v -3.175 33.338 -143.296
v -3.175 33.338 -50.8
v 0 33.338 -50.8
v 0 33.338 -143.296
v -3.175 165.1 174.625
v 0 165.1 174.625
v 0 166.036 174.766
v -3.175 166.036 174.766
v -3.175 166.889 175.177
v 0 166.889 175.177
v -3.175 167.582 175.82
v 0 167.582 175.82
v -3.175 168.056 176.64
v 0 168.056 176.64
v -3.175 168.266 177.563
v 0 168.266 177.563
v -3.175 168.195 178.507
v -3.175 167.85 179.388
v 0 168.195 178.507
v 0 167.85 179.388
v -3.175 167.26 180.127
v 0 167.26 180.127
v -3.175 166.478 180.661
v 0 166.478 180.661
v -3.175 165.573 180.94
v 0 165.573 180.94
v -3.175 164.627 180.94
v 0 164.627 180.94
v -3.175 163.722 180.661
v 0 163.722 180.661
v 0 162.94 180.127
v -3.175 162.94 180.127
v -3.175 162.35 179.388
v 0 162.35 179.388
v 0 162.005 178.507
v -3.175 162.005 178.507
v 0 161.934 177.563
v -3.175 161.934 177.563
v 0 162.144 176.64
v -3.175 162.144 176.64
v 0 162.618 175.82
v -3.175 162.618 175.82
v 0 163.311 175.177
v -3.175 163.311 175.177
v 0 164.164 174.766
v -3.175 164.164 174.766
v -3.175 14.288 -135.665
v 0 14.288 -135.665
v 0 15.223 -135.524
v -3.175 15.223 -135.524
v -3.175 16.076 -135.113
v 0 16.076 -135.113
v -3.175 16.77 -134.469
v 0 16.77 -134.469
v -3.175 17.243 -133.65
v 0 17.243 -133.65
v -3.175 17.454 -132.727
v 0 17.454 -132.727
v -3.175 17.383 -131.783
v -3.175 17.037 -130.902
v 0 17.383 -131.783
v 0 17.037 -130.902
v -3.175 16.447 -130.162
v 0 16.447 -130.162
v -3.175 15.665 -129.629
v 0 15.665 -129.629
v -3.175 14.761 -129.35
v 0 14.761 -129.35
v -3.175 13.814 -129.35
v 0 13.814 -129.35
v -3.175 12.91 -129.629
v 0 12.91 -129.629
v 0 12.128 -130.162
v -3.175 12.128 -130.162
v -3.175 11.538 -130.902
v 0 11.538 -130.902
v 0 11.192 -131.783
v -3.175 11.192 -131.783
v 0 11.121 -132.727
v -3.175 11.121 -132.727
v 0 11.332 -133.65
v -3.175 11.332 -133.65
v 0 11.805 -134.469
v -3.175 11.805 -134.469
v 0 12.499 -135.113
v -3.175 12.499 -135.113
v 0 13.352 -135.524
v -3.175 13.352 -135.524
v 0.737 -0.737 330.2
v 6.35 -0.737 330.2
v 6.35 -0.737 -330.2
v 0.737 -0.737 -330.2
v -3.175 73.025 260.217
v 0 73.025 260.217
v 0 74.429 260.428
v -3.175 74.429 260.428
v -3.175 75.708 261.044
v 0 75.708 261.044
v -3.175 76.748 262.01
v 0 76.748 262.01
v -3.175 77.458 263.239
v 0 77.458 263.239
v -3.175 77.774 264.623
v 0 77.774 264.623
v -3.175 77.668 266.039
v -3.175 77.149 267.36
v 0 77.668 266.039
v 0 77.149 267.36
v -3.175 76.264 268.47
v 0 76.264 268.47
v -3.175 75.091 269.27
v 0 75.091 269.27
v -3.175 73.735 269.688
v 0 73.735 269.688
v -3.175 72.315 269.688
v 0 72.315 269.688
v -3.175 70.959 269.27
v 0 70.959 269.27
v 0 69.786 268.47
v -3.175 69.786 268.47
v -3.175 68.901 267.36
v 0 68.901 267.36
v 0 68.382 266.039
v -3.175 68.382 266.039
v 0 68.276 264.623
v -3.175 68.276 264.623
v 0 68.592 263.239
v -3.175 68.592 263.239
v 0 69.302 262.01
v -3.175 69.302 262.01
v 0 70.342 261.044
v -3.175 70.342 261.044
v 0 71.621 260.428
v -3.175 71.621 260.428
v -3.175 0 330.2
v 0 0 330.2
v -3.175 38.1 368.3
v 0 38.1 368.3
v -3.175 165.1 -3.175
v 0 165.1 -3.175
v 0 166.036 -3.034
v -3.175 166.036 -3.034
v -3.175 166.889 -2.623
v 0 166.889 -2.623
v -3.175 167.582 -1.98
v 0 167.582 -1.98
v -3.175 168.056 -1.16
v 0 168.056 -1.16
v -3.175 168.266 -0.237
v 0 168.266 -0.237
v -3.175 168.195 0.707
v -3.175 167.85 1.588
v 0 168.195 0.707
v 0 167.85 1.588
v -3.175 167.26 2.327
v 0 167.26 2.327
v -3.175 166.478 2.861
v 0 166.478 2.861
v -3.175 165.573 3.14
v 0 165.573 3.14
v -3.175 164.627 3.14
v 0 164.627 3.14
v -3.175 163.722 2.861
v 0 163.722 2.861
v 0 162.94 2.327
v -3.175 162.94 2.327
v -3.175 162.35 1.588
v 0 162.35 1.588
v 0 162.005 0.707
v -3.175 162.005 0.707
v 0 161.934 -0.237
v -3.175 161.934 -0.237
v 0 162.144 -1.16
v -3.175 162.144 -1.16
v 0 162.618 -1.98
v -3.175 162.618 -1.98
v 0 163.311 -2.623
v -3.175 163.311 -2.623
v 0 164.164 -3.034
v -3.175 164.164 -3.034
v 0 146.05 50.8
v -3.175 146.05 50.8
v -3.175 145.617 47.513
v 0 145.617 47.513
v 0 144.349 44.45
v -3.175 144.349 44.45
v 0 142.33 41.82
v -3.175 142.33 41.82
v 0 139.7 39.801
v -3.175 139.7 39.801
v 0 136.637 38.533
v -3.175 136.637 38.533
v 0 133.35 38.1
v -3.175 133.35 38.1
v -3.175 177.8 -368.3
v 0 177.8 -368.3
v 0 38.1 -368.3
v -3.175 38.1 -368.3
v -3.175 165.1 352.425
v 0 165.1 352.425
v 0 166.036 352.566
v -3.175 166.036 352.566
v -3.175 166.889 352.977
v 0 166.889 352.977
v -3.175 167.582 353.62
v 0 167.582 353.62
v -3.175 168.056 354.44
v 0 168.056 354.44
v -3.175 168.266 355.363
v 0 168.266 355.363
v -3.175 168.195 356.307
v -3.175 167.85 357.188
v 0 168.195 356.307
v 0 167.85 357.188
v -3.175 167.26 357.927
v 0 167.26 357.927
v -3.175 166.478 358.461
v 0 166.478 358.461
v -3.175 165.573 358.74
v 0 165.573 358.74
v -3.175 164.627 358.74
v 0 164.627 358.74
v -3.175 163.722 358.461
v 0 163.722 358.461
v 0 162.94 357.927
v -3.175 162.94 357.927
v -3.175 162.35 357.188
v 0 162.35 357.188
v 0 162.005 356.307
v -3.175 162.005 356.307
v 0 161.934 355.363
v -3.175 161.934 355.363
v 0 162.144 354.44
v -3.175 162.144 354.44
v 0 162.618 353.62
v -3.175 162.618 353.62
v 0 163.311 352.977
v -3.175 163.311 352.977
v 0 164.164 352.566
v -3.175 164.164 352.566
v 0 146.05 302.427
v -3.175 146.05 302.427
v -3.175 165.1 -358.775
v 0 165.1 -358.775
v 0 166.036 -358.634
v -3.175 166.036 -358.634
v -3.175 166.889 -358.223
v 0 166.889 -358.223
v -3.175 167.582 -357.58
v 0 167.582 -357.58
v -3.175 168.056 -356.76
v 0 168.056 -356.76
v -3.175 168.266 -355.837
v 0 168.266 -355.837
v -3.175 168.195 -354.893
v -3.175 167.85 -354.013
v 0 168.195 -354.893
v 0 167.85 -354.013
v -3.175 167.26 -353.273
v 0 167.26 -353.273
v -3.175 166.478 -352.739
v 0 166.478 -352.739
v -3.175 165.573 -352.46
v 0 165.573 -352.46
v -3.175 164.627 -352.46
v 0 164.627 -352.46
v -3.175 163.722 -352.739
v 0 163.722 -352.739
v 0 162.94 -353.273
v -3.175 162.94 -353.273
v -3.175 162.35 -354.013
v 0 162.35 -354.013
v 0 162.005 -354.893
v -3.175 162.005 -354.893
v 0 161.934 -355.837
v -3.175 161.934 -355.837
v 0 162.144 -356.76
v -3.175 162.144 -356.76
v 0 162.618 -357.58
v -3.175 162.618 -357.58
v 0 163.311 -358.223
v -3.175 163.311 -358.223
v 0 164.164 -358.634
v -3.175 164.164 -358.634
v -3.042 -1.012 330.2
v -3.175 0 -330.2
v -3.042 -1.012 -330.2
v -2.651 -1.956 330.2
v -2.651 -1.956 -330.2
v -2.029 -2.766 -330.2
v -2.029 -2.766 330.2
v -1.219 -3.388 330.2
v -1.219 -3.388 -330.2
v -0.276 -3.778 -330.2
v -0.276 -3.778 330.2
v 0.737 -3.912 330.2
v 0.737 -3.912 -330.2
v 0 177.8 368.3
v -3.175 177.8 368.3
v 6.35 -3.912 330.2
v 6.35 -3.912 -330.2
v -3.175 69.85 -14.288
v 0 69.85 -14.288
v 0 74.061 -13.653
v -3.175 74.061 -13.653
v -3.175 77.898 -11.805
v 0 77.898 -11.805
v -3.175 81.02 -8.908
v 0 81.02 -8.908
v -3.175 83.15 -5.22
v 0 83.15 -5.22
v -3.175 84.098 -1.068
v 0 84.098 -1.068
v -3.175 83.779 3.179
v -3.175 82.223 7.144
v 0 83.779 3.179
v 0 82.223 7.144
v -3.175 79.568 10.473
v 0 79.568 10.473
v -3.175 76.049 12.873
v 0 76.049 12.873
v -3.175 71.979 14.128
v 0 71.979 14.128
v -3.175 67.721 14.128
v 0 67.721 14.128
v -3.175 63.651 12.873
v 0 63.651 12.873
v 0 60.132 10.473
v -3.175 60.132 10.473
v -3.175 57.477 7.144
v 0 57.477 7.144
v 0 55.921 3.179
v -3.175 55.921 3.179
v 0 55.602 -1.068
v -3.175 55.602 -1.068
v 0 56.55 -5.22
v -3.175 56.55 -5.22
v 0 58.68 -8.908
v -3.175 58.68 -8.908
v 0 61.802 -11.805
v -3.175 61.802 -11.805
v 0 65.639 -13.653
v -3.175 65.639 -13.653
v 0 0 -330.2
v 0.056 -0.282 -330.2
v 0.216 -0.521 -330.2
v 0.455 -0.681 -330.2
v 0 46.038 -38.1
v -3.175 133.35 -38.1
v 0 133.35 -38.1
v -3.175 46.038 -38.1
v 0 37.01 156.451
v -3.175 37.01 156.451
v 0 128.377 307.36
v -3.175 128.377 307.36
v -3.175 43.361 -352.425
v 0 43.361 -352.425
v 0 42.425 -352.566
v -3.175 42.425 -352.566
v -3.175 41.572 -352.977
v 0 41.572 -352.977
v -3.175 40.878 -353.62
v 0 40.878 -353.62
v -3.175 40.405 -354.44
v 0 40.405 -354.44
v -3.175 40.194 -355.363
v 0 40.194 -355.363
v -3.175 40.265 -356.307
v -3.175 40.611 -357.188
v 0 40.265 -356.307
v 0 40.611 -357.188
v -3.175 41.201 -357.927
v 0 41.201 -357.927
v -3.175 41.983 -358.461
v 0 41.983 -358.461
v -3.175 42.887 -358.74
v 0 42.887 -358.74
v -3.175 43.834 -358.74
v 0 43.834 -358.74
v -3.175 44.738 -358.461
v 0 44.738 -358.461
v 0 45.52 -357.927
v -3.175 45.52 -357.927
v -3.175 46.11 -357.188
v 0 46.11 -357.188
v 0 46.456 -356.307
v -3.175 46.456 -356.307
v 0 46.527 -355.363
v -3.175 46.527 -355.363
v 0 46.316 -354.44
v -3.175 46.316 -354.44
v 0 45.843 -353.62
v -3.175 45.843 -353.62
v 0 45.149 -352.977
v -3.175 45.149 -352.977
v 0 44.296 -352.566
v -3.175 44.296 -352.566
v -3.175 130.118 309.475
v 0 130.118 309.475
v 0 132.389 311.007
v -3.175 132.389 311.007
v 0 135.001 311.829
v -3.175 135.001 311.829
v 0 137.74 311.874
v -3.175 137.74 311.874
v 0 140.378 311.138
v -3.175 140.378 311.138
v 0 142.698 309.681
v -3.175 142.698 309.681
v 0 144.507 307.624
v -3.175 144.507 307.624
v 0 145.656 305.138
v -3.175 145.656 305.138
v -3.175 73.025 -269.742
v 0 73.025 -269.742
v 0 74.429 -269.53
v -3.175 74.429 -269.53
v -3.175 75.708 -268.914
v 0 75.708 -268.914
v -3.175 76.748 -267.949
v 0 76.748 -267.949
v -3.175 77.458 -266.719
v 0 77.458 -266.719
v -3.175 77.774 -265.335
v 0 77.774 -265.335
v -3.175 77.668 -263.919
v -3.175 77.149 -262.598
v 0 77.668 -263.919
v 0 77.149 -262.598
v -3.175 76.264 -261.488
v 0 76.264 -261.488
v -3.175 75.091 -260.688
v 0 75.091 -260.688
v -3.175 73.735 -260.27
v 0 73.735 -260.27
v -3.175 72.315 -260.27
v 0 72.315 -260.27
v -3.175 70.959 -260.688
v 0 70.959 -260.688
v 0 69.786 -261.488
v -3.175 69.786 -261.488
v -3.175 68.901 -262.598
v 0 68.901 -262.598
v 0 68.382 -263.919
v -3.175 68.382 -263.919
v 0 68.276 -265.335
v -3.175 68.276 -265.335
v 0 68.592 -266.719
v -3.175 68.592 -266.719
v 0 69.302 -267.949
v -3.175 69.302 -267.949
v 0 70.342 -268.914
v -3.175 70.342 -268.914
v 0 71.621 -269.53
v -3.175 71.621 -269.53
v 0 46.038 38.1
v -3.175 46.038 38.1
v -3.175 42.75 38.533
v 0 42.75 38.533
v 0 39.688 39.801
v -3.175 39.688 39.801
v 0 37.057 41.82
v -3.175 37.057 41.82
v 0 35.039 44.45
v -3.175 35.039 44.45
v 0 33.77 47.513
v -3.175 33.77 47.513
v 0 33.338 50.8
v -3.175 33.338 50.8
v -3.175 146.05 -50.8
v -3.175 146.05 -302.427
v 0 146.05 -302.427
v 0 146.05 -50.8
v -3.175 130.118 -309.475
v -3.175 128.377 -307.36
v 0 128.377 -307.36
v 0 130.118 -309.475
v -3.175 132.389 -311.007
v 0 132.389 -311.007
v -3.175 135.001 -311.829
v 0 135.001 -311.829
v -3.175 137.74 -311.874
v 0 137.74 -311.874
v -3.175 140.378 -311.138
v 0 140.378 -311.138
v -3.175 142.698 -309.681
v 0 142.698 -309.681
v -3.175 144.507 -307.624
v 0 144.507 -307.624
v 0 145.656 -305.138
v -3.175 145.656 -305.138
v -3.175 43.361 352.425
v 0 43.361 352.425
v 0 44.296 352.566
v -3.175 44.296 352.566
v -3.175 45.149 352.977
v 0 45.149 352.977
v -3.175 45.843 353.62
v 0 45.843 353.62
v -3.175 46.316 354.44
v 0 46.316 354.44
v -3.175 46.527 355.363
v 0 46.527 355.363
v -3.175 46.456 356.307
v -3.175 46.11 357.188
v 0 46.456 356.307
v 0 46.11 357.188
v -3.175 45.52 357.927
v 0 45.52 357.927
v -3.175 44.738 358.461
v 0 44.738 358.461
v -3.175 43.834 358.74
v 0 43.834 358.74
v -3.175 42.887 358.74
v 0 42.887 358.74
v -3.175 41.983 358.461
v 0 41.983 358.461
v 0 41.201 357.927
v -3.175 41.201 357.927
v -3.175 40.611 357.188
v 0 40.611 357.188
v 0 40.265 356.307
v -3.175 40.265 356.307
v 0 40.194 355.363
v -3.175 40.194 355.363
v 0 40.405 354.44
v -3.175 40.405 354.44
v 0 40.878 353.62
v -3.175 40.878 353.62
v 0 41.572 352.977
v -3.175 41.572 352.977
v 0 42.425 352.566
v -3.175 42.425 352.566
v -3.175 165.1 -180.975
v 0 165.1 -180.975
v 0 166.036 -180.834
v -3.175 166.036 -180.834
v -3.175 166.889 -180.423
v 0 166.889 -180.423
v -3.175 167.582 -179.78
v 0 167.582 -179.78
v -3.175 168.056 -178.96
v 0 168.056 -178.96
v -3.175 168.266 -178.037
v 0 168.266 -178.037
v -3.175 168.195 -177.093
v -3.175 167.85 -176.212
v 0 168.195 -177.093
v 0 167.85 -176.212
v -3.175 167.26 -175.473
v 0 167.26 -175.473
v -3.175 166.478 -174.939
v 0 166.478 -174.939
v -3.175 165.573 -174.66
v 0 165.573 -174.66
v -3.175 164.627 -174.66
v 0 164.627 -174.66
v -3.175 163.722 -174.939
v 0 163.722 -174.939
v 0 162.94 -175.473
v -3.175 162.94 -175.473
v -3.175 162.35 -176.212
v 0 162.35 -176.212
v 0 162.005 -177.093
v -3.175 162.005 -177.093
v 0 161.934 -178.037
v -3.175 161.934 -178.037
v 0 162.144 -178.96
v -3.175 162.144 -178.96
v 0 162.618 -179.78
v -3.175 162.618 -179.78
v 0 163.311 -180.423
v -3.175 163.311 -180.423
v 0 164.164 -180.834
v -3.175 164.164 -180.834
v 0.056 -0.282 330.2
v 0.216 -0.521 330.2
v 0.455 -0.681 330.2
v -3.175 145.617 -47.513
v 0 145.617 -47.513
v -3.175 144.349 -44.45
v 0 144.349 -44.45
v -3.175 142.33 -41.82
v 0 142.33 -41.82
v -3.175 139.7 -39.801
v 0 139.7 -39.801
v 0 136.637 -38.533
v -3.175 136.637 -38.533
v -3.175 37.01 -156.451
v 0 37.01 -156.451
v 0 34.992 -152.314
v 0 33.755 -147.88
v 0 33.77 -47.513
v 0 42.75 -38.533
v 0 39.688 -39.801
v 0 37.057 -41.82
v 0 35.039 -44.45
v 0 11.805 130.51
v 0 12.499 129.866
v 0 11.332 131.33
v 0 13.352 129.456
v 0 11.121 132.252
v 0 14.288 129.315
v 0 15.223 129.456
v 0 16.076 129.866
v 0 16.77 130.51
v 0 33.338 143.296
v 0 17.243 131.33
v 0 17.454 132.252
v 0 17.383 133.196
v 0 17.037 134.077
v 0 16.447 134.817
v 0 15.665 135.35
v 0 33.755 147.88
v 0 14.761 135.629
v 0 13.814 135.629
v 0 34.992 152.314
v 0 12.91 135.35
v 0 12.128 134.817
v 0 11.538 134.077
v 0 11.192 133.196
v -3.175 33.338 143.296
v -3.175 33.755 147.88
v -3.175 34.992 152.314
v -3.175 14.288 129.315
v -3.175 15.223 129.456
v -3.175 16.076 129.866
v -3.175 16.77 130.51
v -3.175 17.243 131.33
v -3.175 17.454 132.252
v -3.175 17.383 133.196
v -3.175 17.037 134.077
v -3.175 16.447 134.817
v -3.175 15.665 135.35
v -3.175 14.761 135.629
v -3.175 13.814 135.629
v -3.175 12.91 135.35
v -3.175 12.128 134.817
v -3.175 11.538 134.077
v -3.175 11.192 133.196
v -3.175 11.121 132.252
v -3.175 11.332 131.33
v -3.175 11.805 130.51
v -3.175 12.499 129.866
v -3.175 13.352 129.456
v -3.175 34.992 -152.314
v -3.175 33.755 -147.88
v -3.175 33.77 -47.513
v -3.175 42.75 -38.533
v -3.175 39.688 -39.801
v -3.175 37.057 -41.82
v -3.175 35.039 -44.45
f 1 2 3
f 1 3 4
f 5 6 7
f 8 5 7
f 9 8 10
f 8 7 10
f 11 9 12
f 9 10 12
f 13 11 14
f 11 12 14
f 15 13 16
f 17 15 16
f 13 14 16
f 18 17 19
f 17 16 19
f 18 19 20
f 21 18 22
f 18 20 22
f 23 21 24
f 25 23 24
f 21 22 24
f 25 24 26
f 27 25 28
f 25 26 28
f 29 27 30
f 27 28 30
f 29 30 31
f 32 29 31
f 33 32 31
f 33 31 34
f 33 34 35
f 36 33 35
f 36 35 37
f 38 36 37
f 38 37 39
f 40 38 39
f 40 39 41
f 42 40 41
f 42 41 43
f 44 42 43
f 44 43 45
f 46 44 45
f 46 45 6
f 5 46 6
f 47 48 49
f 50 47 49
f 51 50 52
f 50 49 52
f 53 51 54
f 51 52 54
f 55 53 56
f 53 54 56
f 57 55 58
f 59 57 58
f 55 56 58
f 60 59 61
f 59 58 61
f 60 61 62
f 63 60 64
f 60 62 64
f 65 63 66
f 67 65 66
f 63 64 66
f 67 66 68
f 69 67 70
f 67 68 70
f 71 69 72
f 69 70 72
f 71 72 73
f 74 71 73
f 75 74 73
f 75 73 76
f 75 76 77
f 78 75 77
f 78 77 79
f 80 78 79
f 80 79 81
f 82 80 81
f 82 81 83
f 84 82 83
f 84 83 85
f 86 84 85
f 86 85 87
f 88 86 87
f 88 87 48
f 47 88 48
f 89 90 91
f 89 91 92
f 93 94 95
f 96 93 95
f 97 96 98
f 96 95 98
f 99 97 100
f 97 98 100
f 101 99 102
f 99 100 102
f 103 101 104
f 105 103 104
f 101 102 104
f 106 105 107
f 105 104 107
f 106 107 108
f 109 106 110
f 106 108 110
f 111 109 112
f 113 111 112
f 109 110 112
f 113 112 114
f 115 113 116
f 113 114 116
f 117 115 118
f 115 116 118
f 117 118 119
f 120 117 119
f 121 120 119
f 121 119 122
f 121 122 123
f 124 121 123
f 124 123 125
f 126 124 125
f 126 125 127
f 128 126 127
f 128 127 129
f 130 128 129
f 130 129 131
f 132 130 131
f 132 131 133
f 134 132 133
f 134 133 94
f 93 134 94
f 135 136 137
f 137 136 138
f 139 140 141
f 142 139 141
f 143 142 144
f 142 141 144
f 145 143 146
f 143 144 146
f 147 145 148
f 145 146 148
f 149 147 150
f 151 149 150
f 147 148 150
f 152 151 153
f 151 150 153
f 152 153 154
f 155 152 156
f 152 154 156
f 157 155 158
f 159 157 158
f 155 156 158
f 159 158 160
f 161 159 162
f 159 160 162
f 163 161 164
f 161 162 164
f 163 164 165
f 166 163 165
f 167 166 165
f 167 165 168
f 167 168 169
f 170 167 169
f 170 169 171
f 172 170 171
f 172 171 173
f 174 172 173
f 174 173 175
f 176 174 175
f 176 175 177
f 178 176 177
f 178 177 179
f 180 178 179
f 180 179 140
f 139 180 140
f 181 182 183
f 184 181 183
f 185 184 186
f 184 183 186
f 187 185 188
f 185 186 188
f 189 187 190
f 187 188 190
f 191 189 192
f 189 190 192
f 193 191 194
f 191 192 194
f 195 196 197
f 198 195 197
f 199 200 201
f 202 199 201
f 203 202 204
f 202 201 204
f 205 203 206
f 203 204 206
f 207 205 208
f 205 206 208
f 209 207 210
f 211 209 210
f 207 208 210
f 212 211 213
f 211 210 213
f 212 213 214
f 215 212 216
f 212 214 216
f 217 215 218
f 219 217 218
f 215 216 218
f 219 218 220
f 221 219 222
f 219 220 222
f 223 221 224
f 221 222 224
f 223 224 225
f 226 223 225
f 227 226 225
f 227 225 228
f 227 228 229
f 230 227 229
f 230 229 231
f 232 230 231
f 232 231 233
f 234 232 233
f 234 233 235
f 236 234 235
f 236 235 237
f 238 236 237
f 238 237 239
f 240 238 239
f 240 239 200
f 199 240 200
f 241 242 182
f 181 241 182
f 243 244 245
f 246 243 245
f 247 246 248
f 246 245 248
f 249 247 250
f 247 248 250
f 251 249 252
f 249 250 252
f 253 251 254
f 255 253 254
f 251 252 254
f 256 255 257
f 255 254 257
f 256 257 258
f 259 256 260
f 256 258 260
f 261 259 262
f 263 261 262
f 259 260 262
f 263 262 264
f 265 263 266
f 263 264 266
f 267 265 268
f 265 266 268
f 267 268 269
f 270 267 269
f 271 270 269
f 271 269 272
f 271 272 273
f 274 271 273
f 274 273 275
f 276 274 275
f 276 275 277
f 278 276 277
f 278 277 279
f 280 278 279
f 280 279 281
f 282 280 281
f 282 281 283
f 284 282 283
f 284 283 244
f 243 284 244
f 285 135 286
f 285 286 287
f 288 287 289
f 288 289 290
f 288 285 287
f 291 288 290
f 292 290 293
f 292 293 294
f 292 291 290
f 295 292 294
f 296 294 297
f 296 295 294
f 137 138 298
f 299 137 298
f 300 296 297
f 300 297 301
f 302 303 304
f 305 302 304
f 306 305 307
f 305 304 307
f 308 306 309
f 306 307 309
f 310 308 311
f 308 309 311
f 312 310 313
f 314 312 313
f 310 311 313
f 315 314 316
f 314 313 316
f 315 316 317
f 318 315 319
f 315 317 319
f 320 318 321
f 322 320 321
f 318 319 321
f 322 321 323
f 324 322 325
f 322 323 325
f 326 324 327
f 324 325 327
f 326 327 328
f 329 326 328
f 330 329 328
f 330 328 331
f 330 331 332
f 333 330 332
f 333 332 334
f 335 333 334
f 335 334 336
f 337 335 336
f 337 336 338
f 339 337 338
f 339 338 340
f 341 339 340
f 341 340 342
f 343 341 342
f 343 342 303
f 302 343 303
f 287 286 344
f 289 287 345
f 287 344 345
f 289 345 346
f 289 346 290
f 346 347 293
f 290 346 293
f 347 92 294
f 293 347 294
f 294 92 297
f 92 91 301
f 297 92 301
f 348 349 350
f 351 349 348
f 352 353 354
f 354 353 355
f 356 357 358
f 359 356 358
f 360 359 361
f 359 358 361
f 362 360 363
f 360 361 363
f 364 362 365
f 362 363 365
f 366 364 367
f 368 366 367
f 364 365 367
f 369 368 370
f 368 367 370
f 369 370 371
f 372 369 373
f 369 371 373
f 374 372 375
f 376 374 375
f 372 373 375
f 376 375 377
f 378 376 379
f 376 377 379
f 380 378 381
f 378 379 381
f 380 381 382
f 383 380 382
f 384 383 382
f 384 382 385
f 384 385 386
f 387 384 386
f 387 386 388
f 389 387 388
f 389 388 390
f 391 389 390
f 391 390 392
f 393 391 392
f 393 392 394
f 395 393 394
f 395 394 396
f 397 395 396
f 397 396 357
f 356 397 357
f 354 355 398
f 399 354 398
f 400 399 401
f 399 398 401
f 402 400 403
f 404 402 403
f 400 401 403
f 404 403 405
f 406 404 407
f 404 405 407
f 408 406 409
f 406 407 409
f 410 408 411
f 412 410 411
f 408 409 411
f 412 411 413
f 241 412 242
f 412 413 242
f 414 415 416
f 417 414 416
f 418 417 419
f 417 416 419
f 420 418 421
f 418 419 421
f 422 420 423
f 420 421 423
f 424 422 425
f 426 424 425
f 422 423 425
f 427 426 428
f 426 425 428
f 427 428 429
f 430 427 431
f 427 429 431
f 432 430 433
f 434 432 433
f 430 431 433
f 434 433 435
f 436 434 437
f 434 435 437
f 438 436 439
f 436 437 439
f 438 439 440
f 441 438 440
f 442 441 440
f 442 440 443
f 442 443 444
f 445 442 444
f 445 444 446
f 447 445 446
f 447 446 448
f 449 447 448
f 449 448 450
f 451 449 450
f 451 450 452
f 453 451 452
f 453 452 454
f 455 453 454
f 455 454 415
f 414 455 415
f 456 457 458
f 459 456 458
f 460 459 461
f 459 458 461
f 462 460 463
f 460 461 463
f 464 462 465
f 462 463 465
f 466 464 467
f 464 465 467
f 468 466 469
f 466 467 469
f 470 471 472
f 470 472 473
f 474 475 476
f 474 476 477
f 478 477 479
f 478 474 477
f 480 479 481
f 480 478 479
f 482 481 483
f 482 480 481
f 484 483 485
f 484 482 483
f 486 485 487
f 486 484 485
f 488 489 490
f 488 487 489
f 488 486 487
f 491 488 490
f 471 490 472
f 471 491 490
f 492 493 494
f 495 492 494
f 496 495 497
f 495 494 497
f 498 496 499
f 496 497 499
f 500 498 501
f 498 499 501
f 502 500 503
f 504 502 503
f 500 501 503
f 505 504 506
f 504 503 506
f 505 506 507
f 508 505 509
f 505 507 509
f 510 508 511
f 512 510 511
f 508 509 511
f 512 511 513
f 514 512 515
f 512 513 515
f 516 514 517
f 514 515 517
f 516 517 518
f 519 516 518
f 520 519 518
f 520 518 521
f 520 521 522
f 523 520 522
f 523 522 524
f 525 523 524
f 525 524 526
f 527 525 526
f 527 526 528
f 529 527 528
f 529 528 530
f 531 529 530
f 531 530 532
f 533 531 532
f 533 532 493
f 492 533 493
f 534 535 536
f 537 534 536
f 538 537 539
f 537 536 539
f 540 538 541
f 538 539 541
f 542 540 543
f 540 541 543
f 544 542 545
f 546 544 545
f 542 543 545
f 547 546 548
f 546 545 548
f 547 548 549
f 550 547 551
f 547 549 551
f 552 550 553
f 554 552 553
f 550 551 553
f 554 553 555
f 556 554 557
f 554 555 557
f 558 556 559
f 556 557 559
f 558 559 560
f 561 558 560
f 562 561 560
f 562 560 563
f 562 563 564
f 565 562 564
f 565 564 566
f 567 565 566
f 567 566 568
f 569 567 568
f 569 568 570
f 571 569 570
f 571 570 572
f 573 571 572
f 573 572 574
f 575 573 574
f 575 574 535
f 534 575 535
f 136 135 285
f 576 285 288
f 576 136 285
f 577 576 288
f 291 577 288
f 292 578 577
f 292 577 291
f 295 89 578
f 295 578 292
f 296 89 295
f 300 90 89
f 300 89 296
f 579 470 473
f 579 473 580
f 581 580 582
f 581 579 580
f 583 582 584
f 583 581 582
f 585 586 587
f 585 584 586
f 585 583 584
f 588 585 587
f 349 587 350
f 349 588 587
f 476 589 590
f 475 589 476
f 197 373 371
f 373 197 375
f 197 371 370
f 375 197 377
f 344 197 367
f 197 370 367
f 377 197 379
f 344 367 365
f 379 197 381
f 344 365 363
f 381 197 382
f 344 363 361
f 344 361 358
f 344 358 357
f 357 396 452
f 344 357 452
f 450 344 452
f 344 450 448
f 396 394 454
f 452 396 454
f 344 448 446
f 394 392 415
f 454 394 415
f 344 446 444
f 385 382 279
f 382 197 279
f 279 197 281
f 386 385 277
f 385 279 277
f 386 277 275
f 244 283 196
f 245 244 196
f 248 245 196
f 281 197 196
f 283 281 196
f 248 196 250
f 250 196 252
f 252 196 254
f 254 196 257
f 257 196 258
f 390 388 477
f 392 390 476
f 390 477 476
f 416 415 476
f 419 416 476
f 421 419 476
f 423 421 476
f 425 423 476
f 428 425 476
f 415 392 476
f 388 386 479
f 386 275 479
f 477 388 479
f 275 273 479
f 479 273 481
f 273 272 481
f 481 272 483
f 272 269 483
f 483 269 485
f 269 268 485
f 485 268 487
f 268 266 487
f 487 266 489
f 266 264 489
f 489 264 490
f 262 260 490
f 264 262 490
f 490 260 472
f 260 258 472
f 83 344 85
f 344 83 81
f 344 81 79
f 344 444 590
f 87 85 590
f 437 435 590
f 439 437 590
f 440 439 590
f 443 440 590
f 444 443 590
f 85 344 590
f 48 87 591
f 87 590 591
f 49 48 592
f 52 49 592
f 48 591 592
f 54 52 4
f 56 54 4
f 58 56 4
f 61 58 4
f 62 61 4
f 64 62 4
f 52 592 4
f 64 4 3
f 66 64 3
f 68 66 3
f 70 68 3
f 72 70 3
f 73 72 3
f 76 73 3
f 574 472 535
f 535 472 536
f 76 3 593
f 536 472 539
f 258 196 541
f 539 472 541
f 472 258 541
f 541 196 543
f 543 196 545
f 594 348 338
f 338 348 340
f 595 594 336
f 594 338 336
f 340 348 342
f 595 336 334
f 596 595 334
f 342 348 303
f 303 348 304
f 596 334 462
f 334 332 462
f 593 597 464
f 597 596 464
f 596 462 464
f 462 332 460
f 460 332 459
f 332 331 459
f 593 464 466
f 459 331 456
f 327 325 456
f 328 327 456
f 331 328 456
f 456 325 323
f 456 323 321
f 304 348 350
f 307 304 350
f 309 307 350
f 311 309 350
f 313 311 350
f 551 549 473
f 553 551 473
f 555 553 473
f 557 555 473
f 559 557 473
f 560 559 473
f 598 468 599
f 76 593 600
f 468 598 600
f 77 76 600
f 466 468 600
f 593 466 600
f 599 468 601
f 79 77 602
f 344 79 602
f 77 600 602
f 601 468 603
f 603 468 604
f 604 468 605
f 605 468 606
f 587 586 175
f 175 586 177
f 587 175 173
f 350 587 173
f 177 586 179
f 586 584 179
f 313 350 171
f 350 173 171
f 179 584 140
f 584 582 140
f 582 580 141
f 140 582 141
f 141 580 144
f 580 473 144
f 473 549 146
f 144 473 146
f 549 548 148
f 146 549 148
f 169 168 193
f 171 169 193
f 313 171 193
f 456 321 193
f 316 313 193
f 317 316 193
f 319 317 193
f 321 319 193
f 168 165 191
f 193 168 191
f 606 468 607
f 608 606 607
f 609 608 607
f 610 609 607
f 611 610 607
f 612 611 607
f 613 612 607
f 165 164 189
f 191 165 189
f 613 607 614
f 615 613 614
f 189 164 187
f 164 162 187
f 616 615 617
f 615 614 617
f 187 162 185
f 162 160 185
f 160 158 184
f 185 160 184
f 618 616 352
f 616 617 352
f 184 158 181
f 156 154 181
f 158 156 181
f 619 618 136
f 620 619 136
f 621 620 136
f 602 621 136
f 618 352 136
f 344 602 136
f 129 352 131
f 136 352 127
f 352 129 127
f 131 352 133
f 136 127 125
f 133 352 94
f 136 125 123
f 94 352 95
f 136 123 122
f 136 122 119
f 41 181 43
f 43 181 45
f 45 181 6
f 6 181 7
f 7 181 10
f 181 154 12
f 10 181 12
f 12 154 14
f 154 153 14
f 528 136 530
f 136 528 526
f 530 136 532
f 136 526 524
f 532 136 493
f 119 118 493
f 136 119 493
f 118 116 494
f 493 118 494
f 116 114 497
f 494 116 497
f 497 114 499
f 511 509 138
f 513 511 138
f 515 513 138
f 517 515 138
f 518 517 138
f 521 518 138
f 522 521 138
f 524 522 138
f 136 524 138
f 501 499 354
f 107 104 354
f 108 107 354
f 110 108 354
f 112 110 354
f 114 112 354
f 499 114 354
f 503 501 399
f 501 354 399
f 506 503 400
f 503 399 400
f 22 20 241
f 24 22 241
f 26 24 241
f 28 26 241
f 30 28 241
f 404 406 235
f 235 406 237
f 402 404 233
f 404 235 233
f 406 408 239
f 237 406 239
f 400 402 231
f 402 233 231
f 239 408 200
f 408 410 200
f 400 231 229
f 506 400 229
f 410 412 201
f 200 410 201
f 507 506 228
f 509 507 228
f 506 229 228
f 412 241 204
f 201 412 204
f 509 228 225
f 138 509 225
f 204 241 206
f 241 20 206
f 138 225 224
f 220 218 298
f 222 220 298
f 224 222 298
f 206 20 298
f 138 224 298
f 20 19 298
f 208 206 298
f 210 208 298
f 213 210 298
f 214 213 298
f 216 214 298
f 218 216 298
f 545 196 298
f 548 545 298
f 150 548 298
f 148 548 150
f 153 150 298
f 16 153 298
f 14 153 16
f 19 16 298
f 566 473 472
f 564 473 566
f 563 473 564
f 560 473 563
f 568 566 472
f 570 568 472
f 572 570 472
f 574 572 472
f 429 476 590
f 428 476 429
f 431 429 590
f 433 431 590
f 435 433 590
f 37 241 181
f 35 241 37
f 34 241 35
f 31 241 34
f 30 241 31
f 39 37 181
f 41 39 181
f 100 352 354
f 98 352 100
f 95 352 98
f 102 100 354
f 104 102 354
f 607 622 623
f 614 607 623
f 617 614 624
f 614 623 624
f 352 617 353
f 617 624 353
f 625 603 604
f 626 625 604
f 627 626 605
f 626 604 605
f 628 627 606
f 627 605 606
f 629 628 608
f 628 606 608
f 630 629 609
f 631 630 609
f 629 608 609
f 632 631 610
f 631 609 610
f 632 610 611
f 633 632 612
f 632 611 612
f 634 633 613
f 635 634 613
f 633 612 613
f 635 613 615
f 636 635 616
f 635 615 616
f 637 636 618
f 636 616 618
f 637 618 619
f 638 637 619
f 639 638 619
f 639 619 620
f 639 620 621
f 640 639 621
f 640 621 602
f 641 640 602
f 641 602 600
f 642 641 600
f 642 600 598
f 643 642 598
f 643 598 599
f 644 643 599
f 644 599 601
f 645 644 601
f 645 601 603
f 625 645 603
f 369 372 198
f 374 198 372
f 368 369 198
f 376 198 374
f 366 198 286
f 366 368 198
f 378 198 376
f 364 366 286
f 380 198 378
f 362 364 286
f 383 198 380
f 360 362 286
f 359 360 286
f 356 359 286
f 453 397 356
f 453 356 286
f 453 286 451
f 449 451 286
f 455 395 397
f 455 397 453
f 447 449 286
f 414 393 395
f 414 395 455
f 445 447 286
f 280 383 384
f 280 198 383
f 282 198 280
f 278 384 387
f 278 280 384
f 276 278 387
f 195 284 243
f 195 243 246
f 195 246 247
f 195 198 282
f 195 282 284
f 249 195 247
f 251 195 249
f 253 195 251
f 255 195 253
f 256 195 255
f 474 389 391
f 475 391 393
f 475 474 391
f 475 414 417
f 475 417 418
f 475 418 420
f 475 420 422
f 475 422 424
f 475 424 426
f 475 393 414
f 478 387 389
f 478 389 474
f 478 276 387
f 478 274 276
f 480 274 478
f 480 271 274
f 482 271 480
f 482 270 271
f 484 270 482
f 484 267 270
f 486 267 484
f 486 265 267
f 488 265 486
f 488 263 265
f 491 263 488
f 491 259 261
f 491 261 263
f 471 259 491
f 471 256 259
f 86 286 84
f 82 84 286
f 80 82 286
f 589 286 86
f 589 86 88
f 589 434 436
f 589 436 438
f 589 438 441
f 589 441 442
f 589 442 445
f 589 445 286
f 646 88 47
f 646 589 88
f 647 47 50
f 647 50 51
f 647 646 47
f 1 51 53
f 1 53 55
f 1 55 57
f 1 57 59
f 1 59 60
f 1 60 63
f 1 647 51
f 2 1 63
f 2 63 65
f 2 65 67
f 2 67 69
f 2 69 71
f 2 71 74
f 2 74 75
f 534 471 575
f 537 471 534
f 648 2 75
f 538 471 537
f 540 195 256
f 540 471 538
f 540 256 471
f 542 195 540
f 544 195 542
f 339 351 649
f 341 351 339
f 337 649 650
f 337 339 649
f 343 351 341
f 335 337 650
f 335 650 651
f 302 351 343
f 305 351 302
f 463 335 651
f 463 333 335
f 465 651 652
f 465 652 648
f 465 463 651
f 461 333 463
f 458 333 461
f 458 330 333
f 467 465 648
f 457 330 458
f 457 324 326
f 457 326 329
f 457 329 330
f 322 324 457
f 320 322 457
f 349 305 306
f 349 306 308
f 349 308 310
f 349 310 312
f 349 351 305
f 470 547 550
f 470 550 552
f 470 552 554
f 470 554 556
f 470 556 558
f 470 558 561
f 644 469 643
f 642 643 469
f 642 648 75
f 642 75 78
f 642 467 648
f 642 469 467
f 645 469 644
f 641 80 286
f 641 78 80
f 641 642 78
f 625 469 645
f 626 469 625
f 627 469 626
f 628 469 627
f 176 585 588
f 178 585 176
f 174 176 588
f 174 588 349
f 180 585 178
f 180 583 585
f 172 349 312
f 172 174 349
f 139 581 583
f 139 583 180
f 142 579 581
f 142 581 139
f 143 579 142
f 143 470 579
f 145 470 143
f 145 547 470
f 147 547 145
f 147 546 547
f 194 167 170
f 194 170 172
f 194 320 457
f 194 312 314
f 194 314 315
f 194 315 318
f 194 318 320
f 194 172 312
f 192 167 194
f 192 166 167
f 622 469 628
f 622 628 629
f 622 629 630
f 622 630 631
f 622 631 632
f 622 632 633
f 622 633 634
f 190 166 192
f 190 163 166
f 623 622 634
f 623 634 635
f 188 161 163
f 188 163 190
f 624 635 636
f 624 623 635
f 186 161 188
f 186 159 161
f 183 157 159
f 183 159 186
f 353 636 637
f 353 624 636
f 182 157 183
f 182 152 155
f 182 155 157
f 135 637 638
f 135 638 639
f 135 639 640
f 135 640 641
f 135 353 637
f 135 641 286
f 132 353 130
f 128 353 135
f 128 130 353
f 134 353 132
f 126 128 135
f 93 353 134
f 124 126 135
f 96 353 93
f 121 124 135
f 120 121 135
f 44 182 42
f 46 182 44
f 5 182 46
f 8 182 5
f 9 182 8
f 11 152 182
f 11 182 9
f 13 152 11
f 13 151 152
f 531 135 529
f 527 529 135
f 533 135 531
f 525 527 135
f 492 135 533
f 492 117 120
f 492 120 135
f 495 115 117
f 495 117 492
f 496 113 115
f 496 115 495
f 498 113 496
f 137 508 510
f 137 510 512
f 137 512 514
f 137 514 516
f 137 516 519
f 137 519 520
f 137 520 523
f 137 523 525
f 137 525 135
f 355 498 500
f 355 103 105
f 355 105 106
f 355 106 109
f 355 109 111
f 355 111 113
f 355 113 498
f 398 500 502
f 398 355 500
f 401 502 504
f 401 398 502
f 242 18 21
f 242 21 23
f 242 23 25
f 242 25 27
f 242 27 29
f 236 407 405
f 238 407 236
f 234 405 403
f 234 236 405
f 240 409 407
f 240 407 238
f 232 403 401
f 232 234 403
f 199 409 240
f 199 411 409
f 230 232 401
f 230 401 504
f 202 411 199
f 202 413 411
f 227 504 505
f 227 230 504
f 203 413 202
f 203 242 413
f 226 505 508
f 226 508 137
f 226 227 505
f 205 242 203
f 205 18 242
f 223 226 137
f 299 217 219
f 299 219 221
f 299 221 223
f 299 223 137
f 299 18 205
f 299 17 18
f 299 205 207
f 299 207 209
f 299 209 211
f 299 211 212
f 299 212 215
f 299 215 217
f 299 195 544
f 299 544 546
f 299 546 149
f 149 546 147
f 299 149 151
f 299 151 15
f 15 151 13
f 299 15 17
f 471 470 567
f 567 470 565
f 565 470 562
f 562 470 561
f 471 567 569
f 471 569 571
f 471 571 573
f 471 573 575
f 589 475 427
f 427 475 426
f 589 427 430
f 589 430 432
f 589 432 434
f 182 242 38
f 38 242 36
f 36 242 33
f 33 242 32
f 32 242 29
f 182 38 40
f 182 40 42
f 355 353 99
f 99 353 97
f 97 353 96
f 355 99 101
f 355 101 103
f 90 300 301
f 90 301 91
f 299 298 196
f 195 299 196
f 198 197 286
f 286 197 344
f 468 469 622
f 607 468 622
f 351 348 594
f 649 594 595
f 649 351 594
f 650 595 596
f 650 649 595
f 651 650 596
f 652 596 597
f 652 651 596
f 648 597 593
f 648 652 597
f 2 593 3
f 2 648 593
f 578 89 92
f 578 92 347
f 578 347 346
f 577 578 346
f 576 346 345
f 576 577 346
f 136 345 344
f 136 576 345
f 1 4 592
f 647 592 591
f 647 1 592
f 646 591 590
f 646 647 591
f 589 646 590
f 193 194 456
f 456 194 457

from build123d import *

# Parameters (mm, degrees)
BASE_FLANGE1_DEPTH = 3.175
EDGE_FLANGE1_DEPTH = 660.4
SKETCH9_R          = 3.175
SKETCH9_R_2        = 14.2875
SKETCH9_R_3        = 4.7625
CUT_EXTRUDE1_DEPTH = 410.020846046
CUT_EXTRUDE2_DEPTH = 410.082455778


# Sheet-metal steps are written as plain solids
with BuildPart() as part:
    # Sketch1 → Base-Flange1 (new body)
    with BuildSketch(Plane(origin=(0, 0, 0), x_dir=(0, 0, -1), z_dir=(1, 0, 0))):
        Polygon((330.2, 0), (-330.2, 0), (-368.3, 38.1), (-368.3, 177.8), (368.3, 177.8), (368.3, 38.1), align=None)
    extrude(amount=-BASE_FLANGE1_DEPTH)

    # Edge-Flange1 section (across the edge) → Edge-Flange1 (add)
    with BuildSketch(Plane(origin=(0, -0.7366, 330.2), x_dir=(0, 1, 0), z_dir=(0, 0, -1))):
        with BuildLine():
            Line((-3.175, 0.7366), (-3.175, 6.35))
            Line((-3.175, 6.35), (0, 6.35))
            Line((0, 6.35), (0, 0.7366))
            ThreePointArc((0, 0.7366), (0.215745145, 0.215745145), (0.7366, 0))
            Line((0.7366, 0), (0.7366, -3.175))
            ThreePointArc((0.7366, -3.175), (-2.029318885, -2.029318885), (-3.175, 0.7366))
        make_face()
    extrude(amount=EDGE_FLANGE1_DEPTH)

    # Sketch9 → Cut-Extrude1 (cut, through all)
    with BuildSketch(Plane(origin=(0, 0, 0), x_dir=(0, 0, -1), z_dir=(1, 0, 0))):
        with Locations((-355.6, 165.1)):
            Circle(SKETCH9_R)
        with Locations((-355.6, 43.360512242)):
            Circle(SKETCH9_R)
        with Locations((-177.8, 165.1)):
            Circle(SKETCH9_R)
        with Locations((0, 165.1)):
            Circle(SKETCH9_R)
        with Locations((-132.489589571, 14.2875)):
            Circle(SKETCH9_R)
        with Locations((132.489589571, 14.2875)):
            Circle(SKETCH9_R)
        with Locations((177.8, 165.1)):
            Circle(SKETCH9_R)
        with Locations((355.6, 165.1)):
            Circle(SKETCH9_R)
        with Locations(Location((355.6, 43.360512242, 0), (0, 0, 180))):
            Circle(SKETCH9_R)
        with Locations((0, 69.85)):
            Circle(SKETCH9_R_2)
        with Locations((-264.979179141, 73.025)):
            Circle(SKETCH9_R_3)
        with Locations((264.979179141, 73.025)):
            Circle(SKETCH9_R_3)
    extrude(amount=-CUT_EXTRUDE1_DEPTH, mode=Mode.SUBTRACT)

    # Sketch10 → Cut-Extrude2 (cut, through all)
    with BuildSketch(Plane.ZY.offset(3.175)):
        with BuildLine():
            Line((-302.426875206, 146.05), (-50.8, 146.05))
            ThreePointArc((-50.8, 146.05), (-41.819743879, 142.330256121), (-38.1, 133.35))
            Line((-38.1, 133.35), (-38.1, 46.0375))
            ThreePointArc((-38.1, 46.0375), (-41.819743879, 37.057243879), (-50.8, 33.3375))
            Line((-50.8, 33.3375), (-143.295855515, 33.3375))
            ThreePointArc((-143.295855515, 33.3375), (-150.12485752, 34.272734895), (-156.450968109, 37.009568376))
            Line((-156.450968109, 37.009568376), (-307.360042429, 128.377025641))
            ThreePointArc((-307.360042429, 128.377025641), (-311.60116212, 139.085875752), (-302.426875206, 146.05))
        make_face()
        with BuildLine():
            Line((38.1, 133.35), (38.1, 46.0375))
            ThreePointArc((38.1, 46.0375), (41.819743879, 37.057243879), (50.8, 33.3375))
            Line((50.8, 33.3375), (143.295855515, 33.3375))
            ThreePointArc((143.295855515, 33.3375), (150.12485752, 34.272734895), (156.450968109, 37.009568376))
            Line((156.450968109, 37.009568376), (307.360042429, 128.377025641))
            ThreePointArc((307.360042429, 128.377025641), (311.60116212, 139.085875752), (302.426875206, 146.05))
            Line((302.426875206, 146.05), (50.8, 146.05))
            ThreePointArc((50.8, 146.05), (41.819743879, 142.330256121), (38.1, 133.35))
        make_face()
    extrude(amount=-CUT_EXTRUDE2_DEPTH, mode=Mode.SUBTRACT)


solid = part.part
